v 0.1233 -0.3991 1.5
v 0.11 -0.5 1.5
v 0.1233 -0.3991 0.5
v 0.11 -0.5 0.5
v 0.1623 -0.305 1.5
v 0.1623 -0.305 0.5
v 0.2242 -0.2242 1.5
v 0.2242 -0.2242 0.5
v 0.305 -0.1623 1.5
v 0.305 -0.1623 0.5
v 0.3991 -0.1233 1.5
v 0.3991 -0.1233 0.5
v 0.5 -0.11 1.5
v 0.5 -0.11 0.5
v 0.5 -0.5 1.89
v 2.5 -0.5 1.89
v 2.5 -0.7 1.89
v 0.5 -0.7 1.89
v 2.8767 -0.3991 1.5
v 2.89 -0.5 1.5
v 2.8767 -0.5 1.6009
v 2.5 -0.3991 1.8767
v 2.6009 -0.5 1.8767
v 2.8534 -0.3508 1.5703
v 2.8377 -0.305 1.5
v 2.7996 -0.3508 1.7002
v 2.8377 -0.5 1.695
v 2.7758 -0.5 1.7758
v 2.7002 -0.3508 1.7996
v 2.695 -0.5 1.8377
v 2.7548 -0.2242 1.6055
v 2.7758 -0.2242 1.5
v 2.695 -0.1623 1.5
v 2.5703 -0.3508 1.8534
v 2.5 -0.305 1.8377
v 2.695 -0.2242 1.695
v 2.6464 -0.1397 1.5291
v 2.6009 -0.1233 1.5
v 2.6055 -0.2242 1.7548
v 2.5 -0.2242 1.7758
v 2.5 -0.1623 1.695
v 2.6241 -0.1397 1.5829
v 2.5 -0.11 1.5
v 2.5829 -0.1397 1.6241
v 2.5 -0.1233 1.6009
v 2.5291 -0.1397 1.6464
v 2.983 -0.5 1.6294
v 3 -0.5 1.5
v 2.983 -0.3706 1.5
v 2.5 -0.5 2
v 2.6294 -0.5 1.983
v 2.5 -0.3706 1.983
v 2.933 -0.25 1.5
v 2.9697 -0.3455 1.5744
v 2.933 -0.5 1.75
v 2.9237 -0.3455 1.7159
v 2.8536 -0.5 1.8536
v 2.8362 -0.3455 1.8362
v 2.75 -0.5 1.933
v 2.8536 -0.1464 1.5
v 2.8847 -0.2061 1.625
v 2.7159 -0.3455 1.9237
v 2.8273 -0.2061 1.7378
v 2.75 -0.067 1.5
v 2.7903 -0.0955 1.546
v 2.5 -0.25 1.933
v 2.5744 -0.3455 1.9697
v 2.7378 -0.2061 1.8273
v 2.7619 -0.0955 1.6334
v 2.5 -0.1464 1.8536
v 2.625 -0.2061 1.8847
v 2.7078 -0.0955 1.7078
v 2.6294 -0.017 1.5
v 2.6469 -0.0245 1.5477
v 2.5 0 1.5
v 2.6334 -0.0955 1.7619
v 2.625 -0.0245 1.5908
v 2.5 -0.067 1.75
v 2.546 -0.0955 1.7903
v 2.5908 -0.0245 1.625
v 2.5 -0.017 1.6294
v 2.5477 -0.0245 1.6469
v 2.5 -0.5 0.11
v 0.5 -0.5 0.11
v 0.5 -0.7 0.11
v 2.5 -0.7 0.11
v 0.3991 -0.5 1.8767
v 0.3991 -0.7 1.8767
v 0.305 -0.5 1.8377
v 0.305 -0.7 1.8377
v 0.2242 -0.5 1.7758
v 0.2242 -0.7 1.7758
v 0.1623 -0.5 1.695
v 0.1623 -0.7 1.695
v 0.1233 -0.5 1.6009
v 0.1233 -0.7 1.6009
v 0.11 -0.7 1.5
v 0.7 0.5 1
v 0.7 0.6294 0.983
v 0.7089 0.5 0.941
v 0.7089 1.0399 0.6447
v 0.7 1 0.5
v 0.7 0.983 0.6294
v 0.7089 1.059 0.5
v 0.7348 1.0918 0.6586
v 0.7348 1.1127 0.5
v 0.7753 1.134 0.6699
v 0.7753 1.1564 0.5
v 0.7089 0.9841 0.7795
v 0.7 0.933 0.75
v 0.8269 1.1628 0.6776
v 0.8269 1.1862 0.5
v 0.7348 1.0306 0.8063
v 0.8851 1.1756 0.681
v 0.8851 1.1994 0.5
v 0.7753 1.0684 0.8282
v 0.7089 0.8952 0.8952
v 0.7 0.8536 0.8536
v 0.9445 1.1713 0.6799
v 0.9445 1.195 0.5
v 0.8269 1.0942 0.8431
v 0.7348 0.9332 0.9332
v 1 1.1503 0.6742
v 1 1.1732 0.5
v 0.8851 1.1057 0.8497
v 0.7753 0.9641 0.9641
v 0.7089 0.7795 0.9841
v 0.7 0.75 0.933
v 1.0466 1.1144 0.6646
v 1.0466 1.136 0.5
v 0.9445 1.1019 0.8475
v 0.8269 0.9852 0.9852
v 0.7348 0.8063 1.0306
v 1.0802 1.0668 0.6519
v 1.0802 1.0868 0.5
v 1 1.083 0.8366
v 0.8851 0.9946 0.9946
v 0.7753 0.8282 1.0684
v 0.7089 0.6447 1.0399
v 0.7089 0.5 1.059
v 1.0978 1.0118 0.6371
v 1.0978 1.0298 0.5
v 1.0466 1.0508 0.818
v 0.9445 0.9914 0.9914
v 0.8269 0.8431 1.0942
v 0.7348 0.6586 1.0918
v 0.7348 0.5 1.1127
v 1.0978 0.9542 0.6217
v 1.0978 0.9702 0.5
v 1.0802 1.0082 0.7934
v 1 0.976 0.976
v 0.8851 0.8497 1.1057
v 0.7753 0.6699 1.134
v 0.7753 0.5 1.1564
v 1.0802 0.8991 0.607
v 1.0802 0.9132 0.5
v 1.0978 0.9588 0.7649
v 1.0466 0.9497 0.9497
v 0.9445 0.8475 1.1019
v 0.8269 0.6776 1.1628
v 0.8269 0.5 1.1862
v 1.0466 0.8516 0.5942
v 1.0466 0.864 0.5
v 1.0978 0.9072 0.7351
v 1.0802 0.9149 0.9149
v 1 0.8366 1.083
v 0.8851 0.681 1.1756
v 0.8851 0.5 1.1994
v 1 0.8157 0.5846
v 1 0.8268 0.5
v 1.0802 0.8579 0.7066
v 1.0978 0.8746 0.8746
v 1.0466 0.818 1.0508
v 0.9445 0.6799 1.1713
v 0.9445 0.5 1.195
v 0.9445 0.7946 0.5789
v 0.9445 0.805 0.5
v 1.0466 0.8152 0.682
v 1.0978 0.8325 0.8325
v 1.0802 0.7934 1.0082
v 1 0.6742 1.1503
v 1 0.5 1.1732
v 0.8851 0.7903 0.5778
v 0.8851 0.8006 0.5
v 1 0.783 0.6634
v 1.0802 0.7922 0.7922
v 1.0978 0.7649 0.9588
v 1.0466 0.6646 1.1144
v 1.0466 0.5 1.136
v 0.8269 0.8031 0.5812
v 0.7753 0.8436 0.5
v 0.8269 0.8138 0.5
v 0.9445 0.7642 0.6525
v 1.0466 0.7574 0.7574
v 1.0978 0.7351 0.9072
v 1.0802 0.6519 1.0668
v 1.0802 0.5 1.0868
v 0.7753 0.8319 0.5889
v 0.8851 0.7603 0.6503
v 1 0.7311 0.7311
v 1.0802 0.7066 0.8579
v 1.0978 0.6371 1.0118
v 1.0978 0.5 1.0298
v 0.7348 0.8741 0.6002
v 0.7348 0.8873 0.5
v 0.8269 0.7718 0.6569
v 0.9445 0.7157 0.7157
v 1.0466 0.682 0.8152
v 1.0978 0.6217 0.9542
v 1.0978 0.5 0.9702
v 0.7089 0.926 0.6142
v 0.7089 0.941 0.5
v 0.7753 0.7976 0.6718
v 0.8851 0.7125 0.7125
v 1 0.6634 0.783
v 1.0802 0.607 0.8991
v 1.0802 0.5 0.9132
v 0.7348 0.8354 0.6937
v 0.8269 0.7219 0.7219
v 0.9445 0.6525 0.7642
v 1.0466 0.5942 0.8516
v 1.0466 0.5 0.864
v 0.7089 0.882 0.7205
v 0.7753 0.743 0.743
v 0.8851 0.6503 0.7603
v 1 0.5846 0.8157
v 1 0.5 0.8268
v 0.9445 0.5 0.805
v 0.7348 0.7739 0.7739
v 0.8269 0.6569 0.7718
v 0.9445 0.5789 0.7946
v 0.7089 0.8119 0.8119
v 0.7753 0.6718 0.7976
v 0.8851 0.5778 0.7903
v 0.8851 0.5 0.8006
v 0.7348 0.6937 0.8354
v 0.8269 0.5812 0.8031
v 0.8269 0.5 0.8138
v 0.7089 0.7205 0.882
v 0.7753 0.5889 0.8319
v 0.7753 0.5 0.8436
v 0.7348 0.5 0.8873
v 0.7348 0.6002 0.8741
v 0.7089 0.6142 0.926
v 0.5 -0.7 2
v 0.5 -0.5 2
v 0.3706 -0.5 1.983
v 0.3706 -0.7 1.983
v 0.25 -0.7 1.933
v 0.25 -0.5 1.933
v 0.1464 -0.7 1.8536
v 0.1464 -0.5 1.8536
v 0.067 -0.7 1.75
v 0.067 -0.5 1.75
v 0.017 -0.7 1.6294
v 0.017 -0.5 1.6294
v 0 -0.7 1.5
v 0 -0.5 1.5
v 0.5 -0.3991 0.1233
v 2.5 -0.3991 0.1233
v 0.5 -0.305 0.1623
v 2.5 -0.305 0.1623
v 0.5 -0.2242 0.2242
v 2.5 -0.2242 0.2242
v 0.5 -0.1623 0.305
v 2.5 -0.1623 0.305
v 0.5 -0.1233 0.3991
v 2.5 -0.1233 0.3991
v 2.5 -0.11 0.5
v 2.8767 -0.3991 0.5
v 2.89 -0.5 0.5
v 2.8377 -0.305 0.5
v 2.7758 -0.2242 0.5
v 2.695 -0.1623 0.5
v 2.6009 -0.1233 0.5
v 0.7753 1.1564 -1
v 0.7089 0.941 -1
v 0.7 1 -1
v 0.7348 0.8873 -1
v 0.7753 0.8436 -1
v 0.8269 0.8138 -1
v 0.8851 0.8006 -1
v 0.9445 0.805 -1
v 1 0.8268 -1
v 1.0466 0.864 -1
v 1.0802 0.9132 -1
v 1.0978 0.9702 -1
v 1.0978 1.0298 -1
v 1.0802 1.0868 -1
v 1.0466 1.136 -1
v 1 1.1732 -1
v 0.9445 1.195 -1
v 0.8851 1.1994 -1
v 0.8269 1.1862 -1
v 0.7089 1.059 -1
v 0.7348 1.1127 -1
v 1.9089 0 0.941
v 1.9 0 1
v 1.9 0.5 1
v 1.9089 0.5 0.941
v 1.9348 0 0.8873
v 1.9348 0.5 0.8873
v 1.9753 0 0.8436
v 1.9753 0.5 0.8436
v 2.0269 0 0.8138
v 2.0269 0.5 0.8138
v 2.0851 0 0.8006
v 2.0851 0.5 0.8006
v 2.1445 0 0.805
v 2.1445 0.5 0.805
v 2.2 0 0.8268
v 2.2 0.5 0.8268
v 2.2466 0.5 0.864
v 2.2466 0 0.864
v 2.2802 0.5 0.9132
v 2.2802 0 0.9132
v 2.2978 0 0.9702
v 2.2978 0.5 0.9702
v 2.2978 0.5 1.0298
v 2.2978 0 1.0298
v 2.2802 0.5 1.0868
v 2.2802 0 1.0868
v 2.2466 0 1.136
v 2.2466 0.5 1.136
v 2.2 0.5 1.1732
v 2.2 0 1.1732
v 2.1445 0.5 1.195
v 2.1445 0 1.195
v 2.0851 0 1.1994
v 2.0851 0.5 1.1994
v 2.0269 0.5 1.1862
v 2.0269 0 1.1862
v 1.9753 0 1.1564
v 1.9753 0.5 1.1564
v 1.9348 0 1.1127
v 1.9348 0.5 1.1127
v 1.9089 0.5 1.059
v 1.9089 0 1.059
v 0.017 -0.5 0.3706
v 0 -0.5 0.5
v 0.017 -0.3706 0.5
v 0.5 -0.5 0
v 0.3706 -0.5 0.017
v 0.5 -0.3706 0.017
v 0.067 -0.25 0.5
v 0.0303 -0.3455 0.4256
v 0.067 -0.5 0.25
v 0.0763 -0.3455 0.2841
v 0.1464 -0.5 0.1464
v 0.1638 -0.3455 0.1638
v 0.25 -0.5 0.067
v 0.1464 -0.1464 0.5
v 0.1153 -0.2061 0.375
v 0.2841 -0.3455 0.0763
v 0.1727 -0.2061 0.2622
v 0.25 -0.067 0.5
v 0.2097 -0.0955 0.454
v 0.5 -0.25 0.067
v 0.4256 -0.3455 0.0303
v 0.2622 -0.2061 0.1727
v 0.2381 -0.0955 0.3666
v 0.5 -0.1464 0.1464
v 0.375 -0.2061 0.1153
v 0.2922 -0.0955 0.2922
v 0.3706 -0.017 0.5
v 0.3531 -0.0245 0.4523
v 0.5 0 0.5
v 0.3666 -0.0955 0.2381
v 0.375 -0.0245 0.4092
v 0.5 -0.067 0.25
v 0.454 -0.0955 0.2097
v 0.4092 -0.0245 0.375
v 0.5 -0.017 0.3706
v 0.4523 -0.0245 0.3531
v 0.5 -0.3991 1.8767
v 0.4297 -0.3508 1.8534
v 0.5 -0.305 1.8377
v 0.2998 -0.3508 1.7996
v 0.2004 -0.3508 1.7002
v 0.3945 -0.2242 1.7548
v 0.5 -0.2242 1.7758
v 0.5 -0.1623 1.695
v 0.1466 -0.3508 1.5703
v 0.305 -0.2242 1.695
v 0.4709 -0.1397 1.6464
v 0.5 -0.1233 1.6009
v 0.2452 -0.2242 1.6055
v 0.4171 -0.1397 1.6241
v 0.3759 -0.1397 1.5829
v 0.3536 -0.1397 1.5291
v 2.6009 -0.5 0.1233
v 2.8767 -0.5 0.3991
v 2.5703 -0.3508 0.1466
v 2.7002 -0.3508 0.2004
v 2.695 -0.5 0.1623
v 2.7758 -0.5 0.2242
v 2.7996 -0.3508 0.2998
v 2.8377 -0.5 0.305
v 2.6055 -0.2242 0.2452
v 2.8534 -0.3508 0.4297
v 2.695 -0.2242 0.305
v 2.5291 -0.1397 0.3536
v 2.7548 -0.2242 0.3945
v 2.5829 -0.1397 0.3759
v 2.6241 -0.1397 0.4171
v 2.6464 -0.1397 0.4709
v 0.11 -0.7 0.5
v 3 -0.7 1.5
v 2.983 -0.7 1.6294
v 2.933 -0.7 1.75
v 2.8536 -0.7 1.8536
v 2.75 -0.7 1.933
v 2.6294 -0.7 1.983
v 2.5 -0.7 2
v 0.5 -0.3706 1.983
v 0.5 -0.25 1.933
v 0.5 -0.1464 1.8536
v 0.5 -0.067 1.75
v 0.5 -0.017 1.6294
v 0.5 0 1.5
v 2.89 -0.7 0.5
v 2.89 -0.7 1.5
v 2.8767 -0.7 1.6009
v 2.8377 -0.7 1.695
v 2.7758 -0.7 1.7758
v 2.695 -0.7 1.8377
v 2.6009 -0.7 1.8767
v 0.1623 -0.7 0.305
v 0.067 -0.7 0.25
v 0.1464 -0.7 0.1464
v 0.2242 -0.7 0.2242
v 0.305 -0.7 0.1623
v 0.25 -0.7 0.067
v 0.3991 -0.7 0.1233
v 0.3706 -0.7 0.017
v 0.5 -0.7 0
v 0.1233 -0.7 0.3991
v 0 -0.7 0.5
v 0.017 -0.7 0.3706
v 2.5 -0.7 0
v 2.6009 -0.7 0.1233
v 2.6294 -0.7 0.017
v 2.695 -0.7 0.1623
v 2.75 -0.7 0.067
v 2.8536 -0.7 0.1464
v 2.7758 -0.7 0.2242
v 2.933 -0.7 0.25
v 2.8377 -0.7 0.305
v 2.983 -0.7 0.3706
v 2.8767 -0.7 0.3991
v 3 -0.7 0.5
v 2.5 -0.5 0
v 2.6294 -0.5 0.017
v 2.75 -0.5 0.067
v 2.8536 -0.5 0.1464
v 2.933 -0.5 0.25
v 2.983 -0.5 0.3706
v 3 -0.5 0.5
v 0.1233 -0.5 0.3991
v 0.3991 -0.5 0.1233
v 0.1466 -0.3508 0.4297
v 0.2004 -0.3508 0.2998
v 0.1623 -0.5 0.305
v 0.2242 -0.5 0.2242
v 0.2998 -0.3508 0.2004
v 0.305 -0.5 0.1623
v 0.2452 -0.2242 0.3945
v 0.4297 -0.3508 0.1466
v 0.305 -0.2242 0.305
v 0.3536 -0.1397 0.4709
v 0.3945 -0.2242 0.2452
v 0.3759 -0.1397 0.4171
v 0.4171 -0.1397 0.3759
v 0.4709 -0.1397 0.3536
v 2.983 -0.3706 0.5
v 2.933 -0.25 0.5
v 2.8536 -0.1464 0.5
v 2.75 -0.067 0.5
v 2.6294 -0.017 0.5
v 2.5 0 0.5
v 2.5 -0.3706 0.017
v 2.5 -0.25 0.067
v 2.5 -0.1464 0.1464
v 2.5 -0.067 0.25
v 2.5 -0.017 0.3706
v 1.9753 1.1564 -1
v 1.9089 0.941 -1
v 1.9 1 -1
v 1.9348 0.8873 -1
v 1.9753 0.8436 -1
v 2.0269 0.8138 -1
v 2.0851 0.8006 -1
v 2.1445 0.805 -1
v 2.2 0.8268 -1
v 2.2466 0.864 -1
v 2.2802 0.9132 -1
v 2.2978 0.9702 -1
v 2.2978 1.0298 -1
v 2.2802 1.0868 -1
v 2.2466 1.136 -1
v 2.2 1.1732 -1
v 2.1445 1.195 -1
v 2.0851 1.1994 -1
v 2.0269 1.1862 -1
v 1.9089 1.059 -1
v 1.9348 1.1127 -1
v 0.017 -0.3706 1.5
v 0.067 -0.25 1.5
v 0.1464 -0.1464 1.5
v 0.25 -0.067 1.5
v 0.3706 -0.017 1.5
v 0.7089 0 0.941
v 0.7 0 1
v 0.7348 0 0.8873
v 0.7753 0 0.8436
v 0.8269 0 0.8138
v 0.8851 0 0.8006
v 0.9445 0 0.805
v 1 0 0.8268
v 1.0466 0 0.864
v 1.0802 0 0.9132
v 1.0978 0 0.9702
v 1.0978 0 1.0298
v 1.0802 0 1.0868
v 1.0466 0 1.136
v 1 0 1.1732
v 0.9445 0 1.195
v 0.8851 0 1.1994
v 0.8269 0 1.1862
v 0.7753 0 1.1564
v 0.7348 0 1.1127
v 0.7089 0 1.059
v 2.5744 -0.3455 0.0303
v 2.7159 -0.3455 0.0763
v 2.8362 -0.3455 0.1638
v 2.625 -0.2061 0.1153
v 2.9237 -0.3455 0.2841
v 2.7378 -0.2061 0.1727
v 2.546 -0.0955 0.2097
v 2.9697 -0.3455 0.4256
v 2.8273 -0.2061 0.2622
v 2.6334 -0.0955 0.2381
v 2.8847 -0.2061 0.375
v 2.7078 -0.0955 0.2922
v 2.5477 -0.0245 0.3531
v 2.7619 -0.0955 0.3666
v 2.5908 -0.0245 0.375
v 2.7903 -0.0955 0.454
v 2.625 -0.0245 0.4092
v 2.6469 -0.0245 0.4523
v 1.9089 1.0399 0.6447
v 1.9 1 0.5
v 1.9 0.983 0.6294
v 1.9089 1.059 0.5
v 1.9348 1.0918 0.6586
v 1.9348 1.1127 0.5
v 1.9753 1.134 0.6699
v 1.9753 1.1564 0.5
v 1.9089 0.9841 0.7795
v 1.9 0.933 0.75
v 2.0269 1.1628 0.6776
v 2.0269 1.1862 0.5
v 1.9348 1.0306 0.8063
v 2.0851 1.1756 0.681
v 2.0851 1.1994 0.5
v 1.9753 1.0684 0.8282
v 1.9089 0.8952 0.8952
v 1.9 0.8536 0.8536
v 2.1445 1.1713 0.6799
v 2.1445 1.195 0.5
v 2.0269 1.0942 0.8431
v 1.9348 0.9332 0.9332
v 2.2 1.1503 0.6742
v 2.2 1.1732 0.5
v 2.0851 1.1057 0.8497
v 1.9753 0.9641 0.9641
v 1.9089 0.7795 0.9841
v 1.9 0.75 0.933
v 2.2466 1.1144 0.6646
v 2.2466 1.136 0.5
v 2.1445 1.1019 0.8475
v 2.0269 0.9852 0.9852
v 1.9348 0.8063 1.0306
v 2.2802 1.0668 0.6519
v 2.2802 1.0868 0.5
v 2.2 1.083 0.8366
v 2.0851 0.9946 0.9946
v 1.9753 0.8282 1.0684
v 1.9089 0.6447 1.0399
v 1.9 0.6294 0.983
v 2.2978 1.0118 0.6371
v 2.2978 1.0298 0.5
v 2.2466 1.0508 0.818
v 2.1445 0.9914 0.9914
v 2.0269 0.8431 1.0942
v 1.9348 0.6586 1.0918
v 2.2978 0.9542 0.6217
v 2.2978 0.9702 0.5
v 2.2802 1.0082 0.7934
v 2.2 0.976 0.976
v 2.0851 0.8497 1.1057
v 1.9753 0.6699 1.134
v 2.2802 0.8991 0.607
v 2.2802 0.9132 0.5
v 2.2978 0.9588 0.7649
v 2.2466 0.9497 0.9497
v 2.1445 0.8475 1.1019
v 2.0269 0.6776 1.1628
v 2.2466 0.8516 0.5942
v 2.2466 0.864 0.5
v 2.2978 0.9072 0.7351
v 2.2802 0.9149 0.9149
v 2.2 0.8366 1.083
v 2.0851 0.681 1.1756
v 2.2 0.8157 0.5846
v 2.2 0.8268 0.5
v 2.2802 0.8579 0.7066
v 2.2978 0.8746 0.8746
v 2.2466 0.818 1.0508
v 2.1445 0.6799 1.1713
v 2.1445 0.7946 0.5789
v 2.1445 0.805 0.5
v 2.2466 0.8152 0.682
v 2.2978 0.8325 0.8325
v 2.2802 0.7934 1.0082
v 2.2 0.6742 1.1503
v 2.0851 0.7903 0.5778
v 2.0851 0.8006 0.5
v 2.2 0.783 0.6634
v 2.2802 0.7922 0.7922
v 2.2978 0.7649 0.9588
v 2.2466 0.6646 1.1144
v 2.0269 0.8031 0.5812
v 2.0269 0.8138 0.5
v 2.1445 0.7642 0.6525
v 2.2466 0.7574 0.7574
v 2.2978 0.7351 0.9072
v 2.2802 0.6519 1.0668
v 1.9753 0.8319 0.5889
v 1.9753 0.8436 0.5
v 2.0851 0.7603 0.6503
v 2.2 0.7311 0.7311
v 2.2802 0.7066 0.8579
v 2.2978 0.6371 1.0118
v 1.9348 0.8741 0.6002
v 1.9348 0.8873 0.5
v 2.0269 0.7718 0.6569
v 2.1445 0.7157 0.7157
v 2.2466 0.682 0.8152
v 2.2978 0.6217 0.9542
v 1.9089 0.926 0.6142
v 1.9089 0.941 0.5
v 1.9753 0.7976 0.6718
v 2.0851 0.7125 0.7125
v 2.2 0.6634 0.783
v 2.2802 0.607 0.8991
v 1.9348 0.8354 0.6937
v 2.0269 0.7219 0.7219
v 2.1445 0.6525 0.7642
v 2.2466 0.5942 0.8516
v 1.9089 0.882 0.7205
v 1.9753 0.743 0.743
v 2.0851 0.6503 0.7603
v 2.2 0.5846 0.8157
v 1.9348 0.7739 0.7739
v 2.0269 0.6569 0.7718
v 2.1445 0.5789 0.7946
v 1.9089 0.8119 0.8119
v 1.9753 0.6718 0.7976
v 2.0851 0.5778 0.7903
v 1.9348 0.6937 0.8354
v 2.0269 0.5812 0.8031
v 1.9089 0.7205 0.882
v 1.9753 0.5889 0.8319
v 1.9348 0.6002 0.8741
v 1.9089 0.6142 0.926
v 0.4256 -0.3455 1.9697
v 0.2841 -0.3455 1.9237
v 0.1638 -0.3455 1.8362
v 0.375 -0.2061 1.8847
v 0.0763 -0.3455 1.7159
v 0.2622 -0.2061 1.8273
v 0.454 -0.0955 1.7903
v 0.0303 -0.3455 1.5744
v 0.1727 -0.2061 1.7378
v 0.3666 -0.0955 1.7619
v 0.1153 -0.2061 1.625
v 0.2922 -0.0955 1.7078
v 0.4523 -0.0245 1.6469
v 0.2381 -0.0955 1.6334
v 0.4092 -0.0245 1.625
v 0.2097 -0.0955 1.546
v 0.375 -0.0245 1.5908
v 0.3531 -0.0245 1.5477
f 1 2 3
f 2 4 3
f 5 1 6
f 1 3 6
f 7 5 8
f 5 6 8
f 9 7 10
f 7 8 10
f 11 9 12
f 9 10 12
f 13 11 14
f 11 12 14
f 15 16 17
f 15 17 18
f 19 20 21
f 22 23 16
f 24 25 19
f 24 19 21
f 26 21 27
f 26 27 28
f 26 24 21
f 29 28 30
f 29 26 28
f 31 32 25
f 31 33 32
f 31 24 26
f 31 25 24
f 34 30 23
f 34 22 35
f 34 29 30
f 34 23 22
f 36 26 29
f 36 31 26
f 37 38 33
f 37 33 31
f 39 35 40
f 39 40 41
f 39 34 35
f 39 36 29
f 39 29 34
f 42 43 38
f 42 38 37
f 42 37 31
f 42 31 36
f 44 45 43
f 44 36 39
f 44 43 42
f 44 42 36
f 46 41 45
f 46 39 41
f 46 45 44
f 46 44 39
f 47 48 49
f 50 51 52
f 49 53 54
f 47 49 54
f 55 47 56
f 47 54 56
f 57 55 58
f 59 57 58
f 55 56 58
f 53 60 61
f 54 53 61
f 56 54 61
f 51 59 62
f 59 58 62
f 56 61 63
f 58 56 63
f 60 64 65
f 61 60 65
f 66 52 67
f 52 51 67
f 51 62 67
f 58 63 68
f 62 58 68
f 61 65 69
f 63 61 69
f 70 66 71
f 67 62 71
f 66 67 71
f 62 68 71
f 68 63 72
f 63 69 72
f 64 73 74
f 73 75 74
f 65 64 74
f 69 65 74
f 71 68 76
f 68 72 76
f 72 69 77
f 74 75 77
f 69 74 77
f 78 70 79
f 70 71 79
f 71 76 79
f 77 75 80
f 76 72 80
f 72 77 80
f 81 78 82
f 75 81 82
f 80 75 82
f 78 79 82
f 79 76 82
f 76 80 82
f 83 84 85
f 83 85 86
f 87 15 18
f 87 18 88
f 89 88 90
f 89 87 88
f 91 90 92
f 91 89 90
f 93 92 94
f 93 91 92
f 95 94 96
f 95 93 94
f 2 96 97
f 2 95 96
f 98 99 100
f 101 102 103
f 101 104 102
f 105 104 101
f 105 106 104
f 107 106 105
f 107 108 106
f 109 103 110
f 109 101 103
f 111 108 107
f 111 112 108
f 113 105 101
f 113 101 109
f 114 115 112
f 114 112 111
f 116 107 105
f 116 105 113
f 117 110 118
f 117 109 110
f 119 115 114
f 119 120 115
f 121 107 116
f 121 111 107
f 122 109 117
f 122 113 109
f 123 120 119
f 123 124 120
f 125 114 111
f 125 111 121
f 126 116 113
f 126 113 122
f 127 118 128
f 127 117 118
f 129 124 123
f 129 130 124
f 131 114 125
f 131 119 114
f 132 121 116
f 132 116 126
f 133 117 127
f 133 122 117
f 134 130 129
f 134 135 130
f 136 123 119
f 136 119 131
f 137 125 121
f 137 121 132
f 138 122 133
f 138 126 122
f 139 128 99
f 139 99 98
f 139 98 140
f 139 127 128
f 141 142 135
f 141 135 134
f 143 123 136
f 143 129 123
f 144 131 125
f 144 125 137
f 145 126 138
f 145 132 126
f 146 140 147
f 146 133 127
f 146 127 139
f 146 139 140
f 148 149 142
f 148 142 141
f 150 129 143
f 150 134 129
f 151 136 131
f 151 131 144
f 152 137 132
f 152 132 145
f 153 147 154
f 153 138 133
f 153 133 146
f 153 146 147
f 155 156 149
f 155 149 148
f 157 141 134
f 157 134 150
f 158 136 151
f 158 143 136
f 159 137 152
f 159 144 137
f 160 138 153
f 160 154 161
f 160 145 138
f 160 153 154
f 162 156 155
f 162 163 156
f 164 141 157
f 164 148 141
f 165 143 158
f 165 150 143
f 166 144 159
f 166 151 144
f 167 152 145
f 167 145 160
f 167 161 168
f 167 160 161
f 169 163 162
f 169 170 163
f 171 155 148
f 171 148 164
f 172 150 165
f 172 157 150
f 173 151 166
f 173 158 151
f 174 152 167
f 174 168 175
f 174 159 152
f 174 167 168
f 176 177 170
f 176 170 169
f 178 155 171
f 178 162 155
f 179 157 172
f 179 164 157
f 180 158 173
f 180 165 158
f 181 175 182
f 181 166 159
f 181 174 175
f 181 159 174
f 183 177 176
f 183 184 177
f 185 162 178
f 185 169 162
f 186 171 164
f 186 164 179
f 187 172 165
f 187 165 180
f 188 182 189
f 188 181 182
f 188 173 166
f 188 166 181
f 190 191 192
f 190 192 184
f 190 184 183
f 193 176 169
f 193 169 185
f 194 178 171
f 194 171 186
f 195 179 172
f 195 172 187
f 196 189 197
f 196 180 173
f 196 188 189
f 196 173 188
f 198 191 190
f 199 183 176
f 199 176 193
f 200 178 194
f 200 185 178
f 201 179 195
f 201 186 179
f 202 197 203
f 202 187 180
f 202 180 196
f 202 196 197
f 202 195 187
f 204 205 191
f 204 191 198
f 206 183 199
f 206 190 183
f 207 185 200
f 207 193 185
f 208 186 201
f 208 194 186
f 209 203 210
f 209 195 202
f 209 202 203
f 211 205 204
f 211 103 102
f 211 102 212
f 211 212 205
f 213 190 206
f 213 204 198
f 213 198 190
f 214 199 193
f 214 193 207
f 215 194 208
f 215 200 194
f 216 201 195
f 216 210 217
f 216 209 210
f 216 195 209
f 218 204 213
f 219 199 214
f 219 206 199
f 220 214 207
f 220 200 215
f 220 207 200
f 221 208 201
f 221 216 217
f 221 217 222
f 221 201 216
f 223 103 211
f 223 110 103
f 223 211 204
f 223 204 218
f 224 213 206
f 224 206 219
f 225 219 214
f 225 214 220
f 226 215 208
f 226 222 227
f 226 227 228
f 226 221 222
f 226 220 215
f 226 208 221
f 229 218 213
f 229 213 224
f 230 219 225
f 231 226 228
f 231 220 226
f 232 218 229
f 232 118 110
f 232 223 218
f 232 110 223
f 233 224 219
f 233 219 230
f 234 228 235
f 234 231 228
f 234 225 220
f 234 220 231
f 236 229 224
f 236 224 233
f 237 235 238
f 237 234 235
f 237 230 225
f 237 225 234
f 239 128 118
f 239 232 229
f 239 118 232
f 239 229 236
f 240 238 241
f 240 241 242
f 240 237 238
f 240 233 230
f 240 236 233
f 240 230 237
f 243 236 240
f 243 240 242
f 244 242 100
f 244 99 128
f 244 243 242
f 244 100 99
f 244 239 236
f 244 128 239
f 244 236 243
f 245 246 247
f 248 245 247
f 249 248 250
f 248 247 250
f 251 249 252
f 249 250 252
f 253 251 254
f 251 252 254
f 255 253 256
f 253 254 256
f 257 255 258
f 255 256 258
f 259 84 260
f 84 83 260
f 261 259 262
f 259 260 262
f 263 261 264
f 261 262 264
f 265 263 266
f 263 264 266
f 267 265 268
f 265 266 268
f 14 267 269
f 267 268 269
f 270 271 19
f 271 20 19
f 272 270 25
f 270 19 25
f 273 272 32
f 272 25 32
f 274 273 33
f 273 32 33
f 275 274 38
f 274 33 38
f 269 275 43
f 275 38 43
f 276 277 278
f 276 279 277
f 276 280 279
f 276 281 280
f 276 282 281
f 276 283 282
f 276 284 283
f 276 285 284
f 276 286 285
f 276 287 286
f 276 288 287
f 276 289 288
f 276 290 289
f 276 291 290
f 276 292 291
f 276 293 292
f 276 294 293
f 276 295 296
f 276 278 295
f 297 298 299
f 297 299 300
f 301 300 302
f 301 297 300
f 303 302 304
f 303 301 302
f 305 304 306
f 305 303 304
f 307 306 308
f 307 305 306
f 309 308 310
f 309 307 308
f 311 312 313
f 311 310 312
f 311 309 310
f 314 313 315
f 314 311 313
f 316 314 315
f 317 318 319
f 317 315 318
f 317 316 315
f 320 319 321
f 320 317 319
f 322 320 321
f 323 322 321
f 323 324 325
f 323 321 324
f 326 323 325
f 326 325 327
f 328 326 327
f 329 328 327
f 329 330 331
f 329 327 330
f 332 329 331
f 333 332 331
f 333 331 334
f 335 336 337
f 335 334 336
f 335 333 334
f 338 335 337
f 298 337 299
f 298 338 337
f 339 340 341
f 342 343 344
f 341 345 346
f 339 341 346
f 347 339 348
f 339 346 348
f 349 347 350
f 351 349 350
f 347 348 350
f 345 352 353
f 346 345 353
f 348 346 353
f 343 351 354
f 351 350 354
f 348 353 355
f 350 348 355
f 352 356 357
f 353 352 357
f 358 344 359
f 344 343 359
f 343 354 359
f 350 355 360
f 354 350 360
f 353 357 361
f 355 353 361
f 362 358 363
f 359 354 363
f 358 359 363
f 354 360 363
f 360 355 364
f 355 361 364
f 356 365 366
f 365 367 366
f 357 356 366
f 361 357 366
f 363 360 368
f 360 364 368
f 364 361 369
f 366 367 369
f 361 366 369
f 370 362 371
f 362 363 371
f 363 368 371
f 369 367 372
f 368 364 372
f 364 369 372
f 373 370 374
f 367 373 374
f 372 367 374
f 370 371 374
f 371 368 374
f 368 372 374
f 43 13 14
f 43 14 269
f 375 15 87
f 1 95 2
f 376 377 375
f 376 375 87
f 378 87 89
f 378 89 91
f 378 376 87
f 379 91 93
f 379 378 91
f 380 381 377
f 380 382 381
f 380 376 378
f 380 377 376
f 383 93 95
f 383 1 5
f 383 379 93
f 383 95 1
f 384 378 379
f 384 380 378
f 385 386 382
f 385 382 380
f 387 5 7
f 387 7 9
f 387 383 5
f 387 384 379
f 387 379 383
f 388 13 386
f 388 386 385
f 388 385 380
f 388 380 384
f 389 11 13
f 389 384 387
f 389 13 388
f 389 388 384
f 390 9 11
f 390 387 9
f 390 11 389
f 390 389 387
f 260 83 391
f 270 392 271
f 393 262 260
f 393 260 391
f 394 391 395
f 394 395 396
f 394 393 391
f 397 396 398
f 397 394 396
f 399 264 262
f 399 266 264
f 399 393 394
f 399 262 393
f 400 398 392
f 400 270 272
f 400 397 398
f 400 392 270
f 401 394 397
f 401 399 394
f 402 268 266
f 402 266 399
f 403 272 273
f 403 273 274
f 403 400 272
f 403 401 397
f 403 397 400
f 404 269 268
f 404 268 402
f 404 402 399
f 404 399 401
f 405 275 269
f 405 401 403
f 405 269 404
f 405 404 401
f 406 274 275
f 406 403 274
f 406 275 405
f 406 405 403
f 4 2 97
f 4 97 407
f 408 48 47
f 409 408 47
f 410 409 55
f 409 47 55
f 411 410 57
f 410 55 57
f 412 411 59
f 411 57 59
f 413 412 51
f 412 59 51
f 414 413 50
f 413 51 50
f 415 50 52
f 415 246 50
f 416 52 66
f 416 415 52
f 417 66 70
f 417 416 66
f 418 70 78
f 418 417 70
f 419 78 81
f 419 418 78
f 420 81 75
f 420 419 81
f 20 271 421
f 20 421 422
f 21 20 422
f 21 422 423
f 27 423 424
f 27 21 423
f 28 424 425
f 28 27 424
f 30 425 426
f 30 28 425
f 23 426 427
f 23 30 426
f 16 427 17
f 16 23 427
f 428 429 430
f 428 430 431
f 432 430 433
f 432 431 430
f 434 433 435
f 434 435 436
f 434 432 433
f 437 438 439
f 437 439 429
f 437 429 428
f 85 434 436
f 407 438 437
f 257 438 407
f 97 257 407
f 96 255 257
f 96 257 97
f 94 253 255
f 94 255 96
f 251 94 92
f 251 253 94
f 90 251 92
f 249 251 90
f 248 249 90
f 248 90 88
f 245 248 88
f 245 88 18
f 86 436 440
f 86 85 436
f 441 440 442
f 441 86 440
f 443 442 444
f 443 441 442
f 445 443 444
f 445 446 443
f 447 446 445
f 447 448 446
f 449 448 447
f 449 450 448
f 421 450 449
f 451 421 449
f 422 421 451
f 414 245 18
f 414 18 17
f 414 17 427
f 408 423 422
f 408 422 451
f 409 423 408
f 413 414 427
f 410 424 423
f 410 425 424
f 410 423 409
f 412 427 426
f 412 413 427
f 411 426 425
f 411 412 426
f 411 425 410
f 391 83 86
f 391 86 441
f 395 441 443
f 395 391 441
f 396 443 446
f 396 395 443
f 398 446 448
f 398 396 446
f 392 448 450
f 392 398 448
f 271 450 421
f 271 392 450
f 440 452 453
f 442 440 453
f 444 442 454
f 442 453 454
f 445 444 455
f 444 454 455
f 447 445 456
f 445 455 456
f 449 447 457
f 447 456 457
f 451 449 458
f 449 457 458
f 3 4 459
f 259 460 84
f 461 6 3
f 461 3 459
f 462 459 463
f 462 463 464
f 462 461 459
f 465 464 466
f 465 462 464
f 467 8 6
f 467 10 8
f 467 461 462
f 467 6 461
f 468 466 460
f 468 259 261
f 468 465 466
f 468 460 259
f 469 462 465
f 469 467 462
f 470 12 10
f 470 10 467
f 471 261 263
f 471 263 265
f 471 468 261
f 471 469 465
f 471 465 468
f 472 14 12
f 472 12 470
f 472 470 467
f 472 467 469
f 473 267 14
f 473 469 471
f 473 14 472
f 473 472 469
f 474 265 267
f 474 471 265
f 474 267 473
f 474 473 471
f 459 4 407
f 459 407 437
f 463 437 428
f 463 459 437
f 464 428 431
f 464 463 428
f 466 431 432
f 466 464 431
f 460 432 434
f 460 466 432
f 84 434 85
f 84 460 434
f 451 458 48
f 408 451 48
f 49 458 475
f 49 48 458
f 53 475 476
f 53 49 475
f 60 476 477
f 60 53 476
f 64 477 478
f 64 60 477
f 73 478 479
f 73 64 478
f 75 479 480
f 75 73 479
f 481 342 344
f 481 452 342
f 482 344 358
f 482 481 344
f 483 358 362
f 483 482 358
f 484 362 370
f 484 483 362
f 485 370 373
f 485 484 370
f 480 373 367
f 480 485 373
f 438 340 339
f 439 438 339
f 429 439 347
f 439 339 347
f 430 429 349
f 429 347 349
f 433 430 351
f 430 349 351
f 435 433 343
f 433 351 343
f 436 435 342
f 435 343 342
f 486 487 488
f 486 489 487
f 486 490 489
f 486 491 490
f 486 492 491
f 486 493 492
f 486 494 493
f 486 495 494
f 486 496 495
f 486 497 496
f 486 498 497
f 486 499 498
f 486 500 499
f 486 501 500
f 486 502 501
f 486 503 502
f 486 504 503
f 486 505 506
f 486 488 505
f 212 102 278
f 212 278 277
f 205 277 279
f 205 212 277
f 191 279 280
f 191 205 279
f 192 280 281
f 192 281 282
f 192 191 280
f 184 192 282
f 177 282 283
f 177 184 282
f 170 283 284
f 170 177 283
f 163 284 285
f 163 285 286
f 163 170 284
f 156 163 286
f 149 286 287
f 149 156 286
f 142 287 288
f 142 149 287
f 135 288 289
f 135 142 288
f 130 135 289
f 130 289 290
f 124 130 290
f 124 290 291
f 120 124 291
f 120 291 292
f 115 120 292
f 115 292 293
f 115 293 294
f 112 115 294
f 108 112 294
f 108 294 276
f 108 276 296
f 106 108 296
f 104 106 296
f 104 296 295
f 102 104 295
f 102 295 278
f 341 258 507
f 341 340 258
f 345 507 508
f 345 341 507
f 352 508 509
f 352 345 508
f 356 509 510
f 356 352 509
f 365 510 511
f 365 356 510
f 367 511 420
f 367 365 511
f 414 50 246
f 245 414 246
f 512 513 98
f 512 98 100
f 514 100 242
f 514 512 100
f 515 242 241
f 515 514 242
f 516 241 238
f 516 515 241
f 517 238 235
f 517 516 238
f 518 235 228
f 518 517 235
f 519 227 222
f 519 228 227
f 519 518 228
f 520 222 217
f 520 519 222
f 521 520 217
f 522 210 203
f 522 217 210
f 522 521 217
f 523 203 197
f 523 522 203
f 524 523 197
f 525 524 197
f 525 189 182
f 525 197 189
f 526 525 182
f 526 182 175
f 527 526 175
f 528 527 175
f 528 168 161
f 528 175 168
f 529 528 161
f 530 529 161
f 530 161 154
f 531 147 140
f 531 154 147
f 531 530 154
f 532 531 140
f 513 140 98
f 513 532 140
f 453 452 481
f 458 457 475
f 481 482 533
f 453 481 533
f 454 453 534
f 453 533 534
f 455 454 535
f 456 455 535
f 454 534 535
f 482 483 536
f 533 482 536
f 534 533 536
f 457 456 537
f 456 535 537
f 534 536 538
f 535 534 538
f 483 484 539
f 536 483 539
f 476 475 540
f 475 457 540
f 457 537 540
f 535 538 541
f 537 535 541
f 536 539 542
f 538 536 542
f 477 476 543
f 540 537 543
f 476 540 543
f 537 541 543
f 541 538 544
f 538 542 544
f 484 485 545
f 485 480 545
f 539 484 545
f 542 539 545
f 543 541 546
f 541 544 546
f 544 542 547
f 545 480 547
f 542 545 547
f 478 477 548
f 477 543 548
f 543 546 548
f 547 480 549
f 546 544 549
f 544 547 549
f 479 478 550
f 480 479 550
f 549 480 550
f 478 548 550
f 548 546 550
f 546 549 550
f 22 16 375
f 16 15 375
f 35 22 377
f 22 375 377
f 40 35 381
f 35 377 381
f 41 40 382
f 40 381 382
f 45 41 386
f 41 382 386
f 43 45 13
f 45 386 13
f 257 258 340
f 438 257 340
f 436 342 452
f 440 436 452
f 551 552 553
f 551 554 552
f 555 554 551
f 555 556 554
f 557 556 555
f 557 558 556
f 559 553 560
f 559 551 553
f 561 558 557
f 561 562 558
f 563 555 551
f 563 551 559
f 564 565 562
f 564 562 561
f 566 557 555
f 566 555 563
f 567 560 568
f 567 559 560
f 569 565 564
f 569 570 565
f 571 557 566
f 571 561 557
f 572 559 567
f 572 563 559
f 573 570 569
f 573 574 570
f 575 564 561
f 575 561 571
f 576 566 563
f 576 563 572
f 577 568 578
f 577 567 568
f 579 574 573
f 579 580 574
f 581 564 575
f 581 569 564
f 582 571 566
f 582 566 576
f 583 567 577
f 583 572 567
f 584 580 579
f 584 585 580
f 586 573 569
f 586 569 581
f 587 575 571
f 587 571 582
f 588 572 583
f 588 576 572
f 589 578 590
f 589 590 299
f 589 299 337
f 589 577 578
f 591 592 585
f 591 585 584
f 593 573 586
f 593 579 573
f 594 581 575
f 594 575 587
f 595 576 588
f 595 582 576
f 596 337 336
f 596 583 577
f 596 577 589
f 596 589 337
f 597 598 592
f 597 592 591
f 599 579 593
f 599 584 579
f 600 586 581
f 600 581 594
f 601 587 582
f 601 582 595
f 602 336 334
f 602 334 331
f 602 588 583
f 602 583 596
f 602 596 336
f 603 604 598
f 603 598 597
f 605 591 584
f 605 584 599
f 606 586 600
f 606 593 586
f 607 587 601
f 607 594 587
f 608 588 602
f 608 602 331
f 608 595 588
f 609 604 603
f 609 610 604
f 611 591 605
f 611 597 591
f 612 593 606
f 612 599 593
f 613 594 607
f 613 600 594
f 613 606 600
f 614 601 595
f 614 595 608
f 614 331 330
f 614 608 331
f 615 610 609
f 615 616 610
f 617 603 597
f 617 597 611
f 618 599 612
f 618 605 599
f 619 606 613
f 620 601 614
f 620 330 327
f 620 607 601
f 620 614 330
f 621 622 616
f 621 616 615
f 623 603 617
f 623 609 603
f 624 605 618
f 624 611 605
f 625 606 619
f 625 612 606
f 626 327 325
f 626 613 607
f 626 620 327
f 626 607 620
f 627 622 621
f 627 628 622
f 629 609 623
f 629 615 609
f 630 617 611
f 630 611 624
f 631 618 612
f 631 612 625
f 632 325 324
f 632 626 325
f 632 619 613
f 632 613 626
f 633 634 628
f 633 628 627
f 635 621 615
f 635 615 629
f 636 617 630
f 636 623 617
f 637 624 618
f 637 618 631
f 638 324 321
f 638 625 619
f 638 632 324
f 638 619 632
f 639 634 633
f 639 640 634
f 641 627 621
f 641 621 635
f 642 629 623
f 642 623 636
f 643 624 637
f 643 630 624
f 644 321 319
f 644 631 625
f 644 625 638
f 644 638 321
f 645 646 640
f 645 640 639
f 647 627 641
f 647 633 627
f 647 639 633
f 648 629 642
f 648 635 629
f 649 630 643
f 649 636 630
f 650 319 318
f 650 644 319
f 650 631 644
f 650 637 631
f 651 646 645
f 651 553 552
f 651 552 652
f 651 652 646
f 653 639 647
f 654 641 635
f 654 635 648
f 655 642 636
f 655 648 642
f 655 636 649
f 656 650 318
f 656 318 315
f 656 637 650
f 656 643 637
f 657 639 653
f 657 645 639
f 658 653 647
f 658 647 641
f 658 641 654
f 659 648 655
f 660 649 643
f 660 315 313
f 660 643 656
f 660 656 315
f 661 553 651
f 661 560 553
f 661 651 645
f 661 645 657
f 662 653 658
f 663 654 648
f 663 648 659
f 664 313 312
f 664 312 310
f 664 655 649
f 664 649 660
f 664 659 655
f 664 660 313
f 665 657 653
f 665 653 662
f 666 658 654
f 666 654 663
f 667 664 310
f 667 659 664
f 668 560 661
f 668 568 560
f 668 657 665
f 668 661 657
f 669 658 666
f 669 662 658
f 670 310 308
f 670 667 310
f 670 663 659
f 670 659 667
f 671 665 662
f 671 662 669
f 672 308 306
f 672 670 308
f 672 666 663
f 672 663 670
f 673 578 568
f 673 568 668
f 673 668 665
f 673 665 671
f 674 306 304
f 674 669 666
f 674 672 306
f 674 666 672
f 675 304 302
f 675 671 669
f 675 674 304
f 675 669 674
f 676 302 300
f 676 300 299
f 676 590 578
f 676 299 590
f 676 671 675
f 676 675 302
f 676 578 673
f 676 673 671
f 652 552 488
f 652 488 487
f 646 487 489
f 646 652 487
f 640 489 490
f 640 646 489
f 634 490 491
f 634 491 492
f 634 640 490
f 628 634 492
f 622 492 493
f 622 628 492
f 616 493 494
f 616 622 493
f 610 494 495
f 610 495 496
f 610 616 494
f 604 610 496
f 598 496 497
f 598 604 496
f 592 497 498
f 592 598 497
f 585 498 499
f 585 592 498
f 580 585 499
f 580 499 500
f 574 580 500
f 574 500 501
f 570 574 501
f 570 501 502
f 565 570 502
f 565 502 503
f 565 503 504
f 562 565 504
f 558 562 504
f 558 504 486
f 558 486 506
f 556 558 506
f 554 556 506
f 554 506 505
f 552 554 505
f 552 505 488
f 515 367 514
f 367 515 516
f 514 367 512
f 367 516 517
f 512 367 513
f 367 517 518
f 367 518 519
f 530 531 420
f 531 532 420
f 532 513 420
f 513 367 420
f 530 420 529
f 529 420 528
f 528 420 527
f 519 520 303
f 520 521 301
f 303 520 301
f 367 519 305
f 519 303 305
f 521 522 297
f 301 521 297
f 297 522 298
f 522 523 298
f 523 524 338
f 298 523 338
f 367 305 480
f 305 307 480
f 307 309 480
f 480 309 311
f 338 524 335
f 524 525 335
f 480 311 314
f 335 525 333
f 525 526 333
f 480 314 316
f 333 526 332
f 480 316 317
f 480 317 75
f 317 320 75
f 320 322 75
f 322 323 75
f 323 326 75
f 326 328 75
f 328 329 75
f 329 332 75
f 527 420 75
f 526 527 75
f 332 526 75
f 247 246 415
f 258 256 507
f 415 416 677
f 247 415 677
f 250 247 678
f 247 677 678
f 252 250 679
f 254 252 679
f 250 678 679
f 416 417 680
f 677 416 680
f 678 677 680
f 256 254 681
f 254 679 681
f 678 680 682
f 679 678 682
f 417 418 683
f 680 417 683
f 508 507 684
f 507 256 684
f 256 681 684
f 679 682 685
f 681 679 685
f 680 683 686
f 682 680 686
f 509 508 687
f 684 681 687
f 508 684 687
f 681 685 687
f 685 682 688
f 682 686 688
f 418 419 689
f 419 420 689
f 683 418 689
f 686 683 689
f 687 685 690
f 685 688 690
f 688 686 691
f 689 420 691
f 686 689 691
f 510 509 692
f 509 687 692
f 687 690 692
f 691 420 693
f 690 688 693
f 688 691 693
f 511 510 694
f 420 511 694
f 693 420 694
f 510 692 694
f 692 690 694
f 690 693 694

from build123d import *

# Parameters (mm, degrees)
F1_DEPTH = 0.7
F2_R     = 0.5
F3_T     = -0.11
F6_R     = 0.2


with BuildPart() as f1:
    # F0 (on Front) → F1 (new body)
    with BuildSketch(Plane.XZ):
        with BuildLine():
            ThreePointArc((0, 0.5), (0.1464466094, 0.1464466094), (0.5, 0))
            Line((0.5, 0), (2.5, 0))
            ThreePointArc((2.5, 0), (2.8535533906, 0.1464466094), (3, 0.5))
            Line((3, 0.5), (3, 1.5))
            ThreePointArc((3, 1.5), (2.8535533906, 1.8535533906), (2.5, 2))
            Line((2.5, 2), (0.5, 2))
            ThreePointArc((0.5, 2), (0.1464466094, 1.8535533906), (0, 1.5))
            Line((0, 1.5), (0, 0.5))
        make_face()
    extrude(amount=F1_DEPTH)

    # F2
    f2_edges = [f1.edges().sort_by_distance(p)[0] for p in [
        (0, 0, 1),
        (0.146447, 0, 0.146447),
        (1.5, 0, 0),
        (2.853553, 0, 0.146447),
        (3, 0, 1),
        (2.853553, 0, 1.853553),
        (1.5, 0, 2),
        (0.146447, 0, 1.853553),
    ]]
    fillet(f2_edges, radius=F2_R)

    # F3
    f3_openings = [f1.faces().sort_by_distance(p)[0] for p in [
        (1.5, -0.7, 1),
    ]]
    offset(amount=F3_T, openings=f3_openings)

    # F7: sweep along a path in F5
    with BuildLine(Plane.YZ.offset(1.5)) as f7_path:
        Line((1, -1), (1, 0.5))
        ThreePointArc((1, 0.5), (0.8535533906, 0.8535533906), (0.5, 1))
        Line((0.5, 1), (0, 1))
    # F6 (on face) → F7 (sweep)
    with BuildSketch(Plane(origin=(0, 0, 0), x_dir=(-1, 0, 0), z_dir=(0, 1, 0))):
        with Locations((-2.1, 1)):
            Circle(F6_R)
        with Locations((-0.9, 1)):
            Circle(F6_R)
    sweep(path=f7_path.line)


solid = f1.part
